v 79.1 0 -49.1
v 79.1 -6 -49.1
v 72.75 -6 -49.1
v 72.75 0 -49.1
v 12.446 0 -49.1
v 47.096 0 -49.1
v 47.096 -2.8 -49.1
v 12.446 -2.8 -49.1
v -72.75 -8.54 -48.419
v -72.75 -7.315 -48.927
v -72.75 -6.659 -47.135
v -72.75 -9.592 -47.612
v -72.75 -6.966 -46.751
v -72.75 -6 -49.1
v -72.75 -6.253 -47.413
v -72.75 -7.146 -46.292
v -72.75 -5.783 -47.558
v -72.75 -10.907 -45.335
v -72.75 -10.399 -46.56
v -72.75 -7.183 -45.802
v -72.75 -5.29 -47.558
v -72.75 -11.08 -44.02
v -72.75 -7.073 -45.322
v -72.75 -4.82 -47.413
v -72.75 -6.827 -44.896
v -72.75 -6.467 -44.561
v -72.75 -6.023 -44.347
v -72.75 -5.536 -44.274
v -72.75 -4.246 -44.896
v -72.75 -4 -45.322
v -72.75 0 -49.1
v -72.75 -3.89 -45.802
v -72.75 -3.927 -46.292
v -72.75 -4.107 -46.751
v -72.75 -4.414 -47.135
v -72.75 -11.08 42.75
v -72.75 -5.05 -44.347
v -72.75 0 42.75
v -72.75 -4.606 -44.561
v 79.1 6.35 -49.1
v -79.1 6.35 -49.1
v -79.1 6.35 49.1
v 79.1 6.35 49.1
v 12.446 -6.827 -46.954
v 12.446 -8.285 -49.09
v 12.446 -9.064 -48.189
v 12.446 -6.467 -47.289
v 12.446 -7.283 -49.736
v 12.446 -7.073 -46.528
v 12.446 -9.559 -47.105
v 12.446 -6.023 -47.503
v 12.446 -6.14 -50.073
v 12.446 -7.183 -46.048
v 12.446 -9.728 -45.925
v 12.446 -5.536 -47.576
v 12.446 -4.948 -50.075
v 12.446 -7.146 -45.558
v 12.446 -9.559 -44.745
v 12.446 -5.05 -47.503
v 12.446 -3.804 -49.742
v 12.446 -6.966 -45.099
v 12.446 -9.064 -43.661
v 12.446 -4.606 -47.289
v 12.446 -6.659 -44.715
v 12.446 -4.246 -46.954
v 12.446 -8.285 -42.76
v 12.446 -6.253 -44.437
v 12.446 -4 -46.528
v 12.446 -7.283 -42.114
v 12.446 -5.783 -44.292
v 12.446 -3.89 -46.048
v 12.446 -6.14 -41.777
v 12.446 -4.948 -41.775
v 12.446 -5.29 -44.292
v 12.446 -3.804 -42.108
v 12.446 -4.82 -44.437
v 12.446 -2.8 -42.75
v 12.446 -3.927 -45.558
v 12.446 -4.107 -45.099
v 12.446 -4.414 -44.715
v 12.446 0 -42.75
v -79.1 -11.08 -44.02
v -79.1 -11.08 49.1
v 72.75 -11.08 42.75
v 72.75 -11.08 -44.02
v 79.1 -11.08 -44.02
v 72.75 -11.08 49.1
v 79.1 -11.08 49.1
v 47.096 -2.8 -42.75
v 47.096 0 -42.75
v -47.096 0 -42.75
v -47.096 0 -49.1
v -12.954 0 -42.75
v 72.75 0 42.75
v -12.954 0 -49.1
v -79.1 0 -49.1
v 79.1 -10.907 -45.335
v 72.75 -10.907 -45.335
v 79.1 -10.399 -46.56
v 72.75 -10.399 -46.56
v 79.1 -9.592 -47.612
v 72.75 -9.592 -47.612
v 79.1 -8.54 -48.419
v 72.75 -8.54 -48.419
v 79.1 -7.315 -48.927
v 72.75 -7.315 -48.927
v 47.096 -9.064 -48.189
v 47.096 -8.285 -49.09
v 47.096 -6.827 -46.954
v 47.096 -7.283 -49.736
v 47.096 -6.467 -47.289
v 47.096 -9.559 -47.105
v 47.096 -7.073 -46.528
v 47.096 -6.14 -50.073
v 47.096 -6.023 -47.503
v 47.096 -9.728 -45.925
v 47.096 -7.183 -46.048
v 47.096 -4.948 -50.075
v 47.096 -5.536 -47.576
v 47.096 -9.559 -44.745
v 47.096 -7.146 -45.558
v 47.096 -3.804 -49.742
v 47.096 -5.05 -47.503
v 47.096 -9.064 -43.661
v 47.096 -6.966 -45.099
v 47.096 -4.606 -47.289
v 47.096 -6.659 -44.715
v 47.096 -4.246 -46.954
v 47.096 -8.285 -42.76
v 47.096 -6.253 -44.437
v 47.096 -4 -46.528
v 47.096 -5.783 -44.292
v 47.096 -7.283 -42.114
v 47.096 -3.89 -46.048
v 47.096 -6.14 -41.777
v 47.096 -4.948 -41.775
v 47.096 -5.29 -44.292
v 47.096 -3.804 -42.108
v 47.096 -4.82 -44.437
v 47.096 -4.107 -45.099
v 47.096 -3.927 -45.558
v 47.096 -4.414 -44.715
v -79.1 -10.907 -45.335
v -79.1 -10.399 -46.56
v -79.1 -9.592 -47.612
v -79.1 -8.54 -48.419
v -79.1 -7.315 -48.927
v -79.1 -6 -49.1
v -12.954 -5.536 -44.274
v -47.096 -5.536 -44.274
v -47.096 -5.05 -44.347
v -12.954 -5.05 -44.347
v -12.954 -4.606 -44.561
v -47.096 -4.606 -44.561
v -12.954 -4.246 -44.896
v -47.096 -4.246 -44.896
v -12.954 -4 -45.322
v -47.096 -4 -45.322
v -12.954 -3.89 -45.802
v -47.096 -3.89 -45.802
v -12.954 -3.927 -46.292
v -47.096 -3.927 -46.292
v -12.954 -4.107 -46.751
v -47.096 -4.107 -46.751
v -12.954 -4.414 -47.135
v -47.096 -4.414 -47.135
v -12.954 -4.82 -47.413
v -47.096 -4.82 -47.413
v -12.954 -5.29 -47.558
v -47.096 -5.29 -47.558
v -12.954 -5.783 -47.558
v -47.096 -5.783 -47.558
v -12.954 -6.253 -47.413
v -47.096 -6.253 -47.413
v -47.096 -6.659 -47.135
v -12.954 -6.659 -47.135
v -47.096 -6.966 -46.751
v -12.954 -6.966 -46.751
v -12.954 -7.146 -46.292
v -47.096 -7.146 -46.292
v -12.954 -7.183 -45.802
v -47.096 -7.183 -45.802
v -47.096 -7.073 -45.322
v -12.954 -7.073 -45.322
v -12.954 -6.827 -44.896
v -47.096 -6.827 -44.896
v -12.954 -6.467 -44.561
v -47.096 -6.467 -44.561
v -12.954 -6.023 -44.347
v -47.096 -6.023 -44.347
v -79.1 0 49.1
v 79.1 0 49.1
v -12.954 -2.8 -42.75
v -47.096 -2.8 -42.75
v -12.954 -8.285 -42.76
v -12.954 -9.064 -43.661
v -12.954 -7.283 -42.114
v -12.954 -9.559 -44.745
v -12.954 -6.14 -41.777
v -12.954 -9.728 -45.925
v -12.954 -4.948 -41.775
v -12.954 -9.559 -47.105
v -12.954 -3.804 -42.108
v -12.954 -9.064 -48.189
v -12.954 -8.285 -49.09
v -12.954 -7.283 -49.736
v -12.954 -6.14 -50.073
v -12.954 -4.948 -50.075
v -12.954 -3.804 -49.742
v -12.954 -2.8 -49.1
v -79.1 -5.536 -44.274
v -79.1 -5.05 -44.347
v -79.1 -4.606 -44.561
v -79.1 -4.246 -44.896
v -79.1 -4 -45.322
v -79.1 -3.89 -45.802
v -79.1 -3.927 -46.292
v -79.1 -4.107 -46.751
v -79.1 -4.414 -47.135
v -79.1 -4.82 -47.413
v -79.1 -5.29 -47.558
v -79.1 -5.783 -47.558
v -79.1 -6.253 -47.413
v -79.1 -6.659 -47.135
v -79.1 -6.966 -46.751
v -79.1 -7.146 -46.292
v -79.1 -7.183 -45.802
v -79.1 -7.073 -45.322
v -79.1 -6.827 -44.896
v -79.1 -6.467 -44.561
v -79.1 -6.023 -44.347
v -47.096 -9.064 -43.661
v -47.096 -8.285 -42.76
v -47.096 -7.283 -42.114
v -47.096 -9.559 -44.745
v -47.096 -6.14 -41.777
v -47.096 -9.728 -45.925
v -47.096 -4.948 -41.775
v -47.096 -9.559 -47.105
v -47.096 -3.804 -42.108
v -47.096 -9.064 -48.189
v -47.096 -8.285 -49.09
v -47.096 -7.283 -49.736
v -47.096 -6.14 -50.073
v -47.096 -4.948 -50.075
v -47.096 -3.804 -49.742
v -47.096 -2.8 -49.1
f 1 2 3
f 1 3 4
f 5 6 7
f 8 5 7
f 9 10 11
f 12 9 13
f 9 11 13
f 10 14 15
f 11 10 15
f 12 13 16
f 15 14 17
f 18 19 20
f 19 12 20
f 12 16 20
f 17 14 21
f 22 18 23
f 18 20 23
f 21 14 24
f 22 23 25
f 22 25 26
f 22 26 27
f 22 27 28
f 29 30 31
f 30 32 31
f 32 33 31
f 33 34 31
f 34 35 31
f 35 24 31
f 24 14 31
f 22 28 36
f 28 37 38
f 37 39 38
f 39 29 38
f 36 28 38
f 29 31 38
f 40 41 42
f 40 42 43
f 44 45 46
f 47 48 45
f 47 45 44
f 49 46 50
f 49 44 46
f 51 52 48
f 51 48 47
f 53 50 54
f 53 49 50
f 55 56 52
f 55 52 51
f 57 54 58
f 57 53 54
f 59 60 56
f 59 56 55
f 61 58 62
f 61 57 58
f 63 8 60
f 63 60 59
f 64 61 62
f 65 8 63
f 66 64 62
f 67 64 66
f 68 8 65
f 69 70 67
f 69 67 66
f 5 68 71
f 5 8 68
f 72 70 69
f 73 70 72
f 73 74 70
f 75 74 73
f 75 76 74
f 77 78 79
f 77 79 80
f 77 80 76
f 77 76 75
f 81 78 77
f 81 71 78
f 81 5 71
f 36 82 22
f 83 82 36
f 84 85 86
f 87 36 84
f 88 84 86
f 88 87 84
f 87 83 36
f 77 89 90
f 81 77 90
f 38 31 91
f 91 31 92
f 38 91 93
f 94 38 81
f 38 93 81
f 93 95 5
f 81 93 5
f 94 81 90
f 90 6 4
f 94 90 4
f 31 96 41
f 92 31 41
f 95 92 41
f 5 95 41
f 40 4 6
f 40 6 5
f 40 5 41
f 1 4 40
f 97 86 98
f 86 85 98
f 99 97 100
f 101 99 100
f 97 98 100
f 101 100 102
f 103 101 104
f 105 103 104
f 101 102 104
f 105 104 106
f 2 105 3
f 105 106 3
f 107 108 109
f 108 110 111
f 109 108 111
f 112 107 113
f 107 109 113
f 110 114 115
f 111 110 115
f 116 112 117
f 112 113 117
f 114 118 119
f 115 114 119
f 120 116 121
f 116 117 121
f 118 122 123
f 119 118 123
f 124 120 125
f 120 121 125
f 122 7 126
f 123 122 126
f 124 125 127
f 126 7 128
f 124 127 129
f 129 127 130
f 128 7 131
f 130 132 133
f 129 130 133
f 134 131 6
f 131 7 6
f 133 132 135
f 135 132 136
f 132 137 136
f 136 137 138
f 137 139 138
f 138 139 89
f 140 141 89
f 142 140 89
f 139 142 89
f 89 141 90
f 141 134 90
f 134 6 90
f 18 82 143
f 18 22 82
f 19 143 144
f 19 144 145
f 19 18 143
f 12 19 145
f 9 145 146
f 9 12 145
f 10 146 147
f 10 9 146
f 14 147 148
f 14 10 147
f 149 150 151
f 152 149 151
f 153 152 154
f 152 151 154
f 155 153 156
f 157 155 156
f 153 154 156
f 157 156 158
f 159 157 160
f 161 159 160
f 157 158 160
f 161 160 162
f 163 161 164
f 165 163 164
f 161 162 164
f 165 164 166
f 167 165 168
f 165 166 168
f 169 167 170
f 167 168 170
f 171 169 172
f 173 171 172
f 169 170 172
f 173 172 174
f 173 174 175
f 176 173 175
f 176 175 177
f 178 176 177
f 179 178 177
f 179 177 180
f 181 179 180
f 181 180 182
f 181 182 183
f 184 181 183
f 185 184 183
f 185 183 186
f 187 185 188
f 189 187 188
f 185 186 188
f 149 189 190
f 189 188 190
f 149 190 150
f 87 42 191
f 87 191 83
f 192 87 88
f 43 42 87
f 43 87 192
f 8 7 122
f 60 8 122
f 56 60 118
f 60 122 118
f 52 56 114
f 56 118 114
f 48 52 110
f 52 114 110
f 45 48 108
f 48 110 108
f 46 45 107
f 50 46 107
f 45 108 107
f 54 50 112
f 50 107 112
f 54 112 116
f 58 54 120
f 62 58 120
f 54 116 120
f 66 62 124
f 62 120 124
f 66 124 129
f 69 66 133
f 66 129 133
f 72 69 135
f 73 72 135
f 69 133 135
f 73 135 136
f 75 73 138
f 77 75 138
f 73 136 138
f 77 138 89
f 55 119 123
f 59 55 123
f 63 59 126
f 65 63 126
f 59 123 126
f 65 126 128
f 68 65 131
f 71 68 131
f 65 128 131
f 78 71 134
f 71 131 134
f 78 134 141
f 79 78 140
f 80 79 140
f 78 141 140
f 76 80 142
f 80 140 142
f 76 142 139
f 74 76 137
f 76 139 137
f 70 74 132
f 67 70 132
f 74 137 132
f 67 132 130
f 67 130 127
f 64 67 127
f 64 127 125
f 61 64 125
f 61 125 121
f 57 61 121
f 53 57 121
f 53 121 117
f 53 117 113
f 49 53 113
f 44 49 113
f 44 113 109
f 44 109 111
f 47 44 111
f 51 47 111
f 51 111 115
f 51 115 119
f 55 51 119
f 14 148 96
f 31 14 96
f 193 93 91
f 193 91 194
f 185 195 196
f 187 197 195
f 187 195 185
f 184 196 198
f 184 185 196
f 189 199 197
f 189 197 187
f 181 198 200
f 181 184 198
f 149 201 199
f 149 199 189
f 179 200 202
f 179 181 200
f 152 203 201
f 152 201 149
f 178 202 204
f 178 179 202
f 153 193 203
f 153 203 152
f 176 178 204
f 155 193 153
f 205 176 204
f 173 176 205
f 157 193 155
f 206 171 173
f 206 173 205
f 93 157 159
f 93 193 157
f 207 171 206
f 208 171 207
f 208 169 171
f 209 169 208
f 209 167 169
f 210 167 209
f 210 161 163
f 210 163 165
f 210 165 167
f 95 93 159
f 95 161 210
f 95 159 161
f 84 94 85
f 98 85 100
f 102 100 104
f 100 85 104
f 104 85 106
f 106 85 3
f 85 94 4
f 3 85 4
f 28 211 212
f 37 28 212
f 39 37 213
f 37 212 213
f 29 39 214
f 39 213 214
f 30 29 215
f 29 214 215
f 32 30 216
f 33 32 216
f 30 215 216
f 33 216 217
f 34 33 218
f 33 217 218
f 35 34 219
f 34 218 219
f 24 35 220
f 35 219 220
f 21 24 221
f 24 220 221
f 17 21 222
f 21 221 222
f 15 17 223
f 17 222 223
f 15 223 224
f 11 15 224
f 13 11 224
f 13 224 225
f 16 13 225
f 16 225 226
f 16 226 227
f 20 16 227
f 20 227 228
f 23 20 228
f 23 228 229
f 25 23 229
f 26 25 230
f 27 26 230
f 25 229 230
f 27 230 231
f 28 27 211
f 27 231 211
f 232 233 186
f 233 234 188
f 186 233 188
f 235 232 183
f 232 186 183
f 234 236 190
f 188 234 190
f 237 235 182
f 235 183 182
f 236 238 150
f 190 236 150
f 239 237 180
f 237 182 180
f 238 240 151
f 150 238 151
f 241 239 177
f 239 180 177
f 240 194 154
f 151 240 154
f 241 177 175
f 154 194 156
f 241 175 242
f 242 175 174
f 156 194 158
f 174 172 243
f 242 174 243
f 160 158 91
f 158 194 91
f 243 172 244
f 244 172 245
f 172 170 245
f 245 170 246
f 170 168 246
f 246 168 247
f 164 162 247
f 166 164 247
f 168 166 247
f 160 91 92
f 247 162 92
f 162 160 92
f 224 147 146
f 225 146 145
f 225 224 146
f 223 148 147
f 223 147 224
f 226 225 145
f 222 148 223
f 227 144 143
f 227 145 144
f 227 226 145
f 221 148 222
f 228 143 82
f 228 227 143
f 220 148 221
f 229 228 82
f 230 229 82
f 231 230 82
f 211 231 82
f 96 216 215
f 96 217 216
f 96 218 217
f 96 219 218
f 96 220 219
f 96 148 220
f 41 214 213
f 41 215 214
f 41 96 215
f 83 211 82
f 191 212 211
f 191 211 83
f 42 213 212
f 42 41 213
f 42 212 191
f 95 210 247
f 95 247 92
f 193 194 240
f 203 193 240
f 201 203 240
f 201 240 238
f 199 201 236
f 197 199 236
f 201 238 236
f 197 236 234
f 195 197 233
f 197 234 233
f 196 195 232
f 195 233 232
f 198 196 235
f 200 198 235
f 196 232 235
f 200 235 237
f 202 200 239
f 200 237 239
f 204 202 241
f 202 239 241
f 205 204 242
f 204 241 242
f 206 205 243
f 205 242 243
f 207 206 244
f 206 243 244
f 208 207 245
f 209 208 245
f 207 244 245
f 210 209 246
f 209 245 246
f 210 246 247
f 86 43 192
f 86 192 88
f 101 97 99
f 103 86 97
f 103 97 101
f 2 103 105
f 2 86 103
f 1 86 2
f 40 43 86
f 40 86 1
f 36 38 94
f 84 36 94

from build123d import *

# Parameters (mm, degrees)
IZIM1_W                     = 158.200000084
IZIM1_H                     = 98.199999942
Y_KSEKLIK_EKSTR_ZYON1_DEPTH = 6.35
Y_KSEKLIK_EKSTR_ZYON2_DEPTH = 34.142000042
Y_KSEKLIK_EKSTR_ZYON3_DEPTH = 34.650000042
IZIM5_R                     = 1.651
KES_EKSTR_ZYON1_DEPTH       = 38.1
IZIM6_R                     = 1.651
KES_EKSTR_ZYON2_DEPTH       = 34.142000042
IZIM7_W                     = 98.200002037
IZIM7_H                     = 11.08
Y_KSEKLIK_EKSTR_ZYON4_DEPTH = 6.35
IZIM10_W                    = 98.200002037
IZIM10_H                    = 11.08
Y_KSEKLIK_EKSTR_ZYON5_DEPTH = 6.35
IZIM12_W                    = 145.500000084
IZIM12_H                    = 11.08
Y_KSEKLIK_EKSTR_ZYON6_DEPTH = 6.35
RADYUS1_R                   = 5.08
RADYUS2_R                   = 5.08
IZIM15_R                    = 1.651
KES_EKSTR_ZYON3_DEPTH       = 6.35


with BuildPart() as part:
    # Çizim1 → Yükseklik-Ekstrüzyon1 (new body)
    with BuildSketch(Plane(origin=(0, 0, 0), x_dir=(1, 0, 0), z_dir=(0, 1, 0))):
        Rectangle(IZIM1_W, IZIM1_H)
    extrude(amount=Y_KSEKLIK_EKSTR_ZYON1_DEPTH)

    # Çizim2 → Yükseklik-Ekstrüzyon2 (add)
    with BuildSketch(Plane(origin=(-47.096000042, 0, 0), x_dir=(0, 0, -1), z_dir=(1, 0, 0))):
        with BuildLine():
            Line((49.100004162, 4.89e-07), (42.750004162, 4.89e-07))
            Line((42.750004162, 4.89e-07), (42.750004162, -2.799659899))
            ThreePointArc((42.750004162, -2.799659899), (45.925004162, -9.728237327), (49.100004162, -2.799659899))
            Line((49.100004162, -2.799659899), (49.100004162, 4.89e-07))
        make_face()
    extrude(amount=Y_KSEKLIK_EKSTR_ZYON2_DEPTH)


with BuildPart() as y_kseklik_ekstr_zyon3_tool:
    # Çizim3 → Yükseklik-Ekstrüzyon3 (new body)
    with BuildSketch(Plane.ZY.offset(-47.096000042)):
        with BuildLine():
            Line((-42.749997505, -7.075e-06), (-49.099997505, -7.075e-06))
            Line((-49.099997505, -7.075e-06), (-49.099997505, -2.799667463))
            ThreePointArc((-49.099997505, -2.799667463), (-45.924997505, -9.728244892), (-42.749997505, -2.799667463))
            Line((-42.749997505, -2.799667463), (-42.749997505, -7.075e-06))
        make_face()
    extrude(amount=Y_KSEKLIK_EKSTR_ZYON3_DEPTH)


with BuildPart() as part_1:
    add(part.part)


with BuildPart() as part_2:
    # Yükseklik-Ekstrüzyon3: joined with y_kseklik_ekstr_zyon3_tool
    add(part_1.part.fuse(y_kseklik_ekstr_zyon3_tool.part, tol=0.00001))

    # Çizim5 → Kes-Ekstrüzyon1 (cut)
    with BuildSketch(Plane(origin=(47.096000042, 0, 0), x_dir=(0, 0, -1), z_dir=(1, 0, 0))):
        with Locations((45.924997505, -5.536489024)):
            Circle(IZIM5_R)
    extrude(amount=-KES_EKSTR_ZYON1_DEPTH, mode=Mode.SUBTRACT)

    # Çizim6 → Kes-Ekstrüzyon2 (cut)
    with BuildSketch(Plane.ZY.offset(47.096000042)):
        with Locations((-45.925004162, -5.536481459)):
            Circle(IZIM6_R)
    extrude(amount=-KES_EKSTR_ZYON2_DEPTH, mode=Mode.SUBTRACT)

    # Çizim7 → Yükseklik-Ekstrüzyon4 (add)
    with BuildSketch(Plane.ZY.offset(79.100000042)):
        with Locations((-1.047e-06, -5.54)):
            Rectangle(IZIM7_W, IZIM7_H)
    extrude(amount=-Y_KSEKLIK_EKSTR_ZYON4_DEPTH)

    # Çizim10 → Yükseklik-Ekstrüzyon5 (add)
    with BuildSketch(Plane(origin=(79.100000042, 0, 0), x_dir=(0, 0, -1), z_dir=(1, 0, 0))):
        with Locations((1.047e-06, -5.54)):
            Rectangle(IZIM10_W, IZIM10_H)
    extrude(amount=-Y_KSEKLIK_EKSTR_ZYON5_DEPTH)

    # Çizim12 → Yükseklik-Ekstrüzyon6 (add)
    with BuildSketch(Plane.XY.offset(49.099999971)):
        with Locations((0, -5.54)):
            Rectangle(IZIM12_W, IZIM12_H)
    extrude(amount=-Y_KSEKLIK_EKSTR_ZYON6_DEPTH)

    # Radyus1
    radyus1_edges = [part_2.edges().sort_by_distance(p)[0] for p in [
        (75.925000042, -11.08, -49.100002066),
    ]]
    fillet(radyus1_edges, radius=RADYUS1_R)

    # Radyus2
    radyus2_edges = [part_2.edges().sort_by_distance(p)[0] for p in [
        (-75.925000042, -11.08, -49.100002066),
    ]]
    fillet(radyus2_edges, radius=RADYUS2_R)

    # Çizim15 → Kes-Ekstrüzyon3 (cut)
    with BuildSketch(Plane.ZY.offset(79.100000042)):
        with Locations((-45.925004162, -5.536481459)):
            Circle(IZIM15_R)
    extrude(amount=-KES_EKSTR_ZYON3_DEPTH, mode=Mode.SUBTRACT)


solid = part_2.part
